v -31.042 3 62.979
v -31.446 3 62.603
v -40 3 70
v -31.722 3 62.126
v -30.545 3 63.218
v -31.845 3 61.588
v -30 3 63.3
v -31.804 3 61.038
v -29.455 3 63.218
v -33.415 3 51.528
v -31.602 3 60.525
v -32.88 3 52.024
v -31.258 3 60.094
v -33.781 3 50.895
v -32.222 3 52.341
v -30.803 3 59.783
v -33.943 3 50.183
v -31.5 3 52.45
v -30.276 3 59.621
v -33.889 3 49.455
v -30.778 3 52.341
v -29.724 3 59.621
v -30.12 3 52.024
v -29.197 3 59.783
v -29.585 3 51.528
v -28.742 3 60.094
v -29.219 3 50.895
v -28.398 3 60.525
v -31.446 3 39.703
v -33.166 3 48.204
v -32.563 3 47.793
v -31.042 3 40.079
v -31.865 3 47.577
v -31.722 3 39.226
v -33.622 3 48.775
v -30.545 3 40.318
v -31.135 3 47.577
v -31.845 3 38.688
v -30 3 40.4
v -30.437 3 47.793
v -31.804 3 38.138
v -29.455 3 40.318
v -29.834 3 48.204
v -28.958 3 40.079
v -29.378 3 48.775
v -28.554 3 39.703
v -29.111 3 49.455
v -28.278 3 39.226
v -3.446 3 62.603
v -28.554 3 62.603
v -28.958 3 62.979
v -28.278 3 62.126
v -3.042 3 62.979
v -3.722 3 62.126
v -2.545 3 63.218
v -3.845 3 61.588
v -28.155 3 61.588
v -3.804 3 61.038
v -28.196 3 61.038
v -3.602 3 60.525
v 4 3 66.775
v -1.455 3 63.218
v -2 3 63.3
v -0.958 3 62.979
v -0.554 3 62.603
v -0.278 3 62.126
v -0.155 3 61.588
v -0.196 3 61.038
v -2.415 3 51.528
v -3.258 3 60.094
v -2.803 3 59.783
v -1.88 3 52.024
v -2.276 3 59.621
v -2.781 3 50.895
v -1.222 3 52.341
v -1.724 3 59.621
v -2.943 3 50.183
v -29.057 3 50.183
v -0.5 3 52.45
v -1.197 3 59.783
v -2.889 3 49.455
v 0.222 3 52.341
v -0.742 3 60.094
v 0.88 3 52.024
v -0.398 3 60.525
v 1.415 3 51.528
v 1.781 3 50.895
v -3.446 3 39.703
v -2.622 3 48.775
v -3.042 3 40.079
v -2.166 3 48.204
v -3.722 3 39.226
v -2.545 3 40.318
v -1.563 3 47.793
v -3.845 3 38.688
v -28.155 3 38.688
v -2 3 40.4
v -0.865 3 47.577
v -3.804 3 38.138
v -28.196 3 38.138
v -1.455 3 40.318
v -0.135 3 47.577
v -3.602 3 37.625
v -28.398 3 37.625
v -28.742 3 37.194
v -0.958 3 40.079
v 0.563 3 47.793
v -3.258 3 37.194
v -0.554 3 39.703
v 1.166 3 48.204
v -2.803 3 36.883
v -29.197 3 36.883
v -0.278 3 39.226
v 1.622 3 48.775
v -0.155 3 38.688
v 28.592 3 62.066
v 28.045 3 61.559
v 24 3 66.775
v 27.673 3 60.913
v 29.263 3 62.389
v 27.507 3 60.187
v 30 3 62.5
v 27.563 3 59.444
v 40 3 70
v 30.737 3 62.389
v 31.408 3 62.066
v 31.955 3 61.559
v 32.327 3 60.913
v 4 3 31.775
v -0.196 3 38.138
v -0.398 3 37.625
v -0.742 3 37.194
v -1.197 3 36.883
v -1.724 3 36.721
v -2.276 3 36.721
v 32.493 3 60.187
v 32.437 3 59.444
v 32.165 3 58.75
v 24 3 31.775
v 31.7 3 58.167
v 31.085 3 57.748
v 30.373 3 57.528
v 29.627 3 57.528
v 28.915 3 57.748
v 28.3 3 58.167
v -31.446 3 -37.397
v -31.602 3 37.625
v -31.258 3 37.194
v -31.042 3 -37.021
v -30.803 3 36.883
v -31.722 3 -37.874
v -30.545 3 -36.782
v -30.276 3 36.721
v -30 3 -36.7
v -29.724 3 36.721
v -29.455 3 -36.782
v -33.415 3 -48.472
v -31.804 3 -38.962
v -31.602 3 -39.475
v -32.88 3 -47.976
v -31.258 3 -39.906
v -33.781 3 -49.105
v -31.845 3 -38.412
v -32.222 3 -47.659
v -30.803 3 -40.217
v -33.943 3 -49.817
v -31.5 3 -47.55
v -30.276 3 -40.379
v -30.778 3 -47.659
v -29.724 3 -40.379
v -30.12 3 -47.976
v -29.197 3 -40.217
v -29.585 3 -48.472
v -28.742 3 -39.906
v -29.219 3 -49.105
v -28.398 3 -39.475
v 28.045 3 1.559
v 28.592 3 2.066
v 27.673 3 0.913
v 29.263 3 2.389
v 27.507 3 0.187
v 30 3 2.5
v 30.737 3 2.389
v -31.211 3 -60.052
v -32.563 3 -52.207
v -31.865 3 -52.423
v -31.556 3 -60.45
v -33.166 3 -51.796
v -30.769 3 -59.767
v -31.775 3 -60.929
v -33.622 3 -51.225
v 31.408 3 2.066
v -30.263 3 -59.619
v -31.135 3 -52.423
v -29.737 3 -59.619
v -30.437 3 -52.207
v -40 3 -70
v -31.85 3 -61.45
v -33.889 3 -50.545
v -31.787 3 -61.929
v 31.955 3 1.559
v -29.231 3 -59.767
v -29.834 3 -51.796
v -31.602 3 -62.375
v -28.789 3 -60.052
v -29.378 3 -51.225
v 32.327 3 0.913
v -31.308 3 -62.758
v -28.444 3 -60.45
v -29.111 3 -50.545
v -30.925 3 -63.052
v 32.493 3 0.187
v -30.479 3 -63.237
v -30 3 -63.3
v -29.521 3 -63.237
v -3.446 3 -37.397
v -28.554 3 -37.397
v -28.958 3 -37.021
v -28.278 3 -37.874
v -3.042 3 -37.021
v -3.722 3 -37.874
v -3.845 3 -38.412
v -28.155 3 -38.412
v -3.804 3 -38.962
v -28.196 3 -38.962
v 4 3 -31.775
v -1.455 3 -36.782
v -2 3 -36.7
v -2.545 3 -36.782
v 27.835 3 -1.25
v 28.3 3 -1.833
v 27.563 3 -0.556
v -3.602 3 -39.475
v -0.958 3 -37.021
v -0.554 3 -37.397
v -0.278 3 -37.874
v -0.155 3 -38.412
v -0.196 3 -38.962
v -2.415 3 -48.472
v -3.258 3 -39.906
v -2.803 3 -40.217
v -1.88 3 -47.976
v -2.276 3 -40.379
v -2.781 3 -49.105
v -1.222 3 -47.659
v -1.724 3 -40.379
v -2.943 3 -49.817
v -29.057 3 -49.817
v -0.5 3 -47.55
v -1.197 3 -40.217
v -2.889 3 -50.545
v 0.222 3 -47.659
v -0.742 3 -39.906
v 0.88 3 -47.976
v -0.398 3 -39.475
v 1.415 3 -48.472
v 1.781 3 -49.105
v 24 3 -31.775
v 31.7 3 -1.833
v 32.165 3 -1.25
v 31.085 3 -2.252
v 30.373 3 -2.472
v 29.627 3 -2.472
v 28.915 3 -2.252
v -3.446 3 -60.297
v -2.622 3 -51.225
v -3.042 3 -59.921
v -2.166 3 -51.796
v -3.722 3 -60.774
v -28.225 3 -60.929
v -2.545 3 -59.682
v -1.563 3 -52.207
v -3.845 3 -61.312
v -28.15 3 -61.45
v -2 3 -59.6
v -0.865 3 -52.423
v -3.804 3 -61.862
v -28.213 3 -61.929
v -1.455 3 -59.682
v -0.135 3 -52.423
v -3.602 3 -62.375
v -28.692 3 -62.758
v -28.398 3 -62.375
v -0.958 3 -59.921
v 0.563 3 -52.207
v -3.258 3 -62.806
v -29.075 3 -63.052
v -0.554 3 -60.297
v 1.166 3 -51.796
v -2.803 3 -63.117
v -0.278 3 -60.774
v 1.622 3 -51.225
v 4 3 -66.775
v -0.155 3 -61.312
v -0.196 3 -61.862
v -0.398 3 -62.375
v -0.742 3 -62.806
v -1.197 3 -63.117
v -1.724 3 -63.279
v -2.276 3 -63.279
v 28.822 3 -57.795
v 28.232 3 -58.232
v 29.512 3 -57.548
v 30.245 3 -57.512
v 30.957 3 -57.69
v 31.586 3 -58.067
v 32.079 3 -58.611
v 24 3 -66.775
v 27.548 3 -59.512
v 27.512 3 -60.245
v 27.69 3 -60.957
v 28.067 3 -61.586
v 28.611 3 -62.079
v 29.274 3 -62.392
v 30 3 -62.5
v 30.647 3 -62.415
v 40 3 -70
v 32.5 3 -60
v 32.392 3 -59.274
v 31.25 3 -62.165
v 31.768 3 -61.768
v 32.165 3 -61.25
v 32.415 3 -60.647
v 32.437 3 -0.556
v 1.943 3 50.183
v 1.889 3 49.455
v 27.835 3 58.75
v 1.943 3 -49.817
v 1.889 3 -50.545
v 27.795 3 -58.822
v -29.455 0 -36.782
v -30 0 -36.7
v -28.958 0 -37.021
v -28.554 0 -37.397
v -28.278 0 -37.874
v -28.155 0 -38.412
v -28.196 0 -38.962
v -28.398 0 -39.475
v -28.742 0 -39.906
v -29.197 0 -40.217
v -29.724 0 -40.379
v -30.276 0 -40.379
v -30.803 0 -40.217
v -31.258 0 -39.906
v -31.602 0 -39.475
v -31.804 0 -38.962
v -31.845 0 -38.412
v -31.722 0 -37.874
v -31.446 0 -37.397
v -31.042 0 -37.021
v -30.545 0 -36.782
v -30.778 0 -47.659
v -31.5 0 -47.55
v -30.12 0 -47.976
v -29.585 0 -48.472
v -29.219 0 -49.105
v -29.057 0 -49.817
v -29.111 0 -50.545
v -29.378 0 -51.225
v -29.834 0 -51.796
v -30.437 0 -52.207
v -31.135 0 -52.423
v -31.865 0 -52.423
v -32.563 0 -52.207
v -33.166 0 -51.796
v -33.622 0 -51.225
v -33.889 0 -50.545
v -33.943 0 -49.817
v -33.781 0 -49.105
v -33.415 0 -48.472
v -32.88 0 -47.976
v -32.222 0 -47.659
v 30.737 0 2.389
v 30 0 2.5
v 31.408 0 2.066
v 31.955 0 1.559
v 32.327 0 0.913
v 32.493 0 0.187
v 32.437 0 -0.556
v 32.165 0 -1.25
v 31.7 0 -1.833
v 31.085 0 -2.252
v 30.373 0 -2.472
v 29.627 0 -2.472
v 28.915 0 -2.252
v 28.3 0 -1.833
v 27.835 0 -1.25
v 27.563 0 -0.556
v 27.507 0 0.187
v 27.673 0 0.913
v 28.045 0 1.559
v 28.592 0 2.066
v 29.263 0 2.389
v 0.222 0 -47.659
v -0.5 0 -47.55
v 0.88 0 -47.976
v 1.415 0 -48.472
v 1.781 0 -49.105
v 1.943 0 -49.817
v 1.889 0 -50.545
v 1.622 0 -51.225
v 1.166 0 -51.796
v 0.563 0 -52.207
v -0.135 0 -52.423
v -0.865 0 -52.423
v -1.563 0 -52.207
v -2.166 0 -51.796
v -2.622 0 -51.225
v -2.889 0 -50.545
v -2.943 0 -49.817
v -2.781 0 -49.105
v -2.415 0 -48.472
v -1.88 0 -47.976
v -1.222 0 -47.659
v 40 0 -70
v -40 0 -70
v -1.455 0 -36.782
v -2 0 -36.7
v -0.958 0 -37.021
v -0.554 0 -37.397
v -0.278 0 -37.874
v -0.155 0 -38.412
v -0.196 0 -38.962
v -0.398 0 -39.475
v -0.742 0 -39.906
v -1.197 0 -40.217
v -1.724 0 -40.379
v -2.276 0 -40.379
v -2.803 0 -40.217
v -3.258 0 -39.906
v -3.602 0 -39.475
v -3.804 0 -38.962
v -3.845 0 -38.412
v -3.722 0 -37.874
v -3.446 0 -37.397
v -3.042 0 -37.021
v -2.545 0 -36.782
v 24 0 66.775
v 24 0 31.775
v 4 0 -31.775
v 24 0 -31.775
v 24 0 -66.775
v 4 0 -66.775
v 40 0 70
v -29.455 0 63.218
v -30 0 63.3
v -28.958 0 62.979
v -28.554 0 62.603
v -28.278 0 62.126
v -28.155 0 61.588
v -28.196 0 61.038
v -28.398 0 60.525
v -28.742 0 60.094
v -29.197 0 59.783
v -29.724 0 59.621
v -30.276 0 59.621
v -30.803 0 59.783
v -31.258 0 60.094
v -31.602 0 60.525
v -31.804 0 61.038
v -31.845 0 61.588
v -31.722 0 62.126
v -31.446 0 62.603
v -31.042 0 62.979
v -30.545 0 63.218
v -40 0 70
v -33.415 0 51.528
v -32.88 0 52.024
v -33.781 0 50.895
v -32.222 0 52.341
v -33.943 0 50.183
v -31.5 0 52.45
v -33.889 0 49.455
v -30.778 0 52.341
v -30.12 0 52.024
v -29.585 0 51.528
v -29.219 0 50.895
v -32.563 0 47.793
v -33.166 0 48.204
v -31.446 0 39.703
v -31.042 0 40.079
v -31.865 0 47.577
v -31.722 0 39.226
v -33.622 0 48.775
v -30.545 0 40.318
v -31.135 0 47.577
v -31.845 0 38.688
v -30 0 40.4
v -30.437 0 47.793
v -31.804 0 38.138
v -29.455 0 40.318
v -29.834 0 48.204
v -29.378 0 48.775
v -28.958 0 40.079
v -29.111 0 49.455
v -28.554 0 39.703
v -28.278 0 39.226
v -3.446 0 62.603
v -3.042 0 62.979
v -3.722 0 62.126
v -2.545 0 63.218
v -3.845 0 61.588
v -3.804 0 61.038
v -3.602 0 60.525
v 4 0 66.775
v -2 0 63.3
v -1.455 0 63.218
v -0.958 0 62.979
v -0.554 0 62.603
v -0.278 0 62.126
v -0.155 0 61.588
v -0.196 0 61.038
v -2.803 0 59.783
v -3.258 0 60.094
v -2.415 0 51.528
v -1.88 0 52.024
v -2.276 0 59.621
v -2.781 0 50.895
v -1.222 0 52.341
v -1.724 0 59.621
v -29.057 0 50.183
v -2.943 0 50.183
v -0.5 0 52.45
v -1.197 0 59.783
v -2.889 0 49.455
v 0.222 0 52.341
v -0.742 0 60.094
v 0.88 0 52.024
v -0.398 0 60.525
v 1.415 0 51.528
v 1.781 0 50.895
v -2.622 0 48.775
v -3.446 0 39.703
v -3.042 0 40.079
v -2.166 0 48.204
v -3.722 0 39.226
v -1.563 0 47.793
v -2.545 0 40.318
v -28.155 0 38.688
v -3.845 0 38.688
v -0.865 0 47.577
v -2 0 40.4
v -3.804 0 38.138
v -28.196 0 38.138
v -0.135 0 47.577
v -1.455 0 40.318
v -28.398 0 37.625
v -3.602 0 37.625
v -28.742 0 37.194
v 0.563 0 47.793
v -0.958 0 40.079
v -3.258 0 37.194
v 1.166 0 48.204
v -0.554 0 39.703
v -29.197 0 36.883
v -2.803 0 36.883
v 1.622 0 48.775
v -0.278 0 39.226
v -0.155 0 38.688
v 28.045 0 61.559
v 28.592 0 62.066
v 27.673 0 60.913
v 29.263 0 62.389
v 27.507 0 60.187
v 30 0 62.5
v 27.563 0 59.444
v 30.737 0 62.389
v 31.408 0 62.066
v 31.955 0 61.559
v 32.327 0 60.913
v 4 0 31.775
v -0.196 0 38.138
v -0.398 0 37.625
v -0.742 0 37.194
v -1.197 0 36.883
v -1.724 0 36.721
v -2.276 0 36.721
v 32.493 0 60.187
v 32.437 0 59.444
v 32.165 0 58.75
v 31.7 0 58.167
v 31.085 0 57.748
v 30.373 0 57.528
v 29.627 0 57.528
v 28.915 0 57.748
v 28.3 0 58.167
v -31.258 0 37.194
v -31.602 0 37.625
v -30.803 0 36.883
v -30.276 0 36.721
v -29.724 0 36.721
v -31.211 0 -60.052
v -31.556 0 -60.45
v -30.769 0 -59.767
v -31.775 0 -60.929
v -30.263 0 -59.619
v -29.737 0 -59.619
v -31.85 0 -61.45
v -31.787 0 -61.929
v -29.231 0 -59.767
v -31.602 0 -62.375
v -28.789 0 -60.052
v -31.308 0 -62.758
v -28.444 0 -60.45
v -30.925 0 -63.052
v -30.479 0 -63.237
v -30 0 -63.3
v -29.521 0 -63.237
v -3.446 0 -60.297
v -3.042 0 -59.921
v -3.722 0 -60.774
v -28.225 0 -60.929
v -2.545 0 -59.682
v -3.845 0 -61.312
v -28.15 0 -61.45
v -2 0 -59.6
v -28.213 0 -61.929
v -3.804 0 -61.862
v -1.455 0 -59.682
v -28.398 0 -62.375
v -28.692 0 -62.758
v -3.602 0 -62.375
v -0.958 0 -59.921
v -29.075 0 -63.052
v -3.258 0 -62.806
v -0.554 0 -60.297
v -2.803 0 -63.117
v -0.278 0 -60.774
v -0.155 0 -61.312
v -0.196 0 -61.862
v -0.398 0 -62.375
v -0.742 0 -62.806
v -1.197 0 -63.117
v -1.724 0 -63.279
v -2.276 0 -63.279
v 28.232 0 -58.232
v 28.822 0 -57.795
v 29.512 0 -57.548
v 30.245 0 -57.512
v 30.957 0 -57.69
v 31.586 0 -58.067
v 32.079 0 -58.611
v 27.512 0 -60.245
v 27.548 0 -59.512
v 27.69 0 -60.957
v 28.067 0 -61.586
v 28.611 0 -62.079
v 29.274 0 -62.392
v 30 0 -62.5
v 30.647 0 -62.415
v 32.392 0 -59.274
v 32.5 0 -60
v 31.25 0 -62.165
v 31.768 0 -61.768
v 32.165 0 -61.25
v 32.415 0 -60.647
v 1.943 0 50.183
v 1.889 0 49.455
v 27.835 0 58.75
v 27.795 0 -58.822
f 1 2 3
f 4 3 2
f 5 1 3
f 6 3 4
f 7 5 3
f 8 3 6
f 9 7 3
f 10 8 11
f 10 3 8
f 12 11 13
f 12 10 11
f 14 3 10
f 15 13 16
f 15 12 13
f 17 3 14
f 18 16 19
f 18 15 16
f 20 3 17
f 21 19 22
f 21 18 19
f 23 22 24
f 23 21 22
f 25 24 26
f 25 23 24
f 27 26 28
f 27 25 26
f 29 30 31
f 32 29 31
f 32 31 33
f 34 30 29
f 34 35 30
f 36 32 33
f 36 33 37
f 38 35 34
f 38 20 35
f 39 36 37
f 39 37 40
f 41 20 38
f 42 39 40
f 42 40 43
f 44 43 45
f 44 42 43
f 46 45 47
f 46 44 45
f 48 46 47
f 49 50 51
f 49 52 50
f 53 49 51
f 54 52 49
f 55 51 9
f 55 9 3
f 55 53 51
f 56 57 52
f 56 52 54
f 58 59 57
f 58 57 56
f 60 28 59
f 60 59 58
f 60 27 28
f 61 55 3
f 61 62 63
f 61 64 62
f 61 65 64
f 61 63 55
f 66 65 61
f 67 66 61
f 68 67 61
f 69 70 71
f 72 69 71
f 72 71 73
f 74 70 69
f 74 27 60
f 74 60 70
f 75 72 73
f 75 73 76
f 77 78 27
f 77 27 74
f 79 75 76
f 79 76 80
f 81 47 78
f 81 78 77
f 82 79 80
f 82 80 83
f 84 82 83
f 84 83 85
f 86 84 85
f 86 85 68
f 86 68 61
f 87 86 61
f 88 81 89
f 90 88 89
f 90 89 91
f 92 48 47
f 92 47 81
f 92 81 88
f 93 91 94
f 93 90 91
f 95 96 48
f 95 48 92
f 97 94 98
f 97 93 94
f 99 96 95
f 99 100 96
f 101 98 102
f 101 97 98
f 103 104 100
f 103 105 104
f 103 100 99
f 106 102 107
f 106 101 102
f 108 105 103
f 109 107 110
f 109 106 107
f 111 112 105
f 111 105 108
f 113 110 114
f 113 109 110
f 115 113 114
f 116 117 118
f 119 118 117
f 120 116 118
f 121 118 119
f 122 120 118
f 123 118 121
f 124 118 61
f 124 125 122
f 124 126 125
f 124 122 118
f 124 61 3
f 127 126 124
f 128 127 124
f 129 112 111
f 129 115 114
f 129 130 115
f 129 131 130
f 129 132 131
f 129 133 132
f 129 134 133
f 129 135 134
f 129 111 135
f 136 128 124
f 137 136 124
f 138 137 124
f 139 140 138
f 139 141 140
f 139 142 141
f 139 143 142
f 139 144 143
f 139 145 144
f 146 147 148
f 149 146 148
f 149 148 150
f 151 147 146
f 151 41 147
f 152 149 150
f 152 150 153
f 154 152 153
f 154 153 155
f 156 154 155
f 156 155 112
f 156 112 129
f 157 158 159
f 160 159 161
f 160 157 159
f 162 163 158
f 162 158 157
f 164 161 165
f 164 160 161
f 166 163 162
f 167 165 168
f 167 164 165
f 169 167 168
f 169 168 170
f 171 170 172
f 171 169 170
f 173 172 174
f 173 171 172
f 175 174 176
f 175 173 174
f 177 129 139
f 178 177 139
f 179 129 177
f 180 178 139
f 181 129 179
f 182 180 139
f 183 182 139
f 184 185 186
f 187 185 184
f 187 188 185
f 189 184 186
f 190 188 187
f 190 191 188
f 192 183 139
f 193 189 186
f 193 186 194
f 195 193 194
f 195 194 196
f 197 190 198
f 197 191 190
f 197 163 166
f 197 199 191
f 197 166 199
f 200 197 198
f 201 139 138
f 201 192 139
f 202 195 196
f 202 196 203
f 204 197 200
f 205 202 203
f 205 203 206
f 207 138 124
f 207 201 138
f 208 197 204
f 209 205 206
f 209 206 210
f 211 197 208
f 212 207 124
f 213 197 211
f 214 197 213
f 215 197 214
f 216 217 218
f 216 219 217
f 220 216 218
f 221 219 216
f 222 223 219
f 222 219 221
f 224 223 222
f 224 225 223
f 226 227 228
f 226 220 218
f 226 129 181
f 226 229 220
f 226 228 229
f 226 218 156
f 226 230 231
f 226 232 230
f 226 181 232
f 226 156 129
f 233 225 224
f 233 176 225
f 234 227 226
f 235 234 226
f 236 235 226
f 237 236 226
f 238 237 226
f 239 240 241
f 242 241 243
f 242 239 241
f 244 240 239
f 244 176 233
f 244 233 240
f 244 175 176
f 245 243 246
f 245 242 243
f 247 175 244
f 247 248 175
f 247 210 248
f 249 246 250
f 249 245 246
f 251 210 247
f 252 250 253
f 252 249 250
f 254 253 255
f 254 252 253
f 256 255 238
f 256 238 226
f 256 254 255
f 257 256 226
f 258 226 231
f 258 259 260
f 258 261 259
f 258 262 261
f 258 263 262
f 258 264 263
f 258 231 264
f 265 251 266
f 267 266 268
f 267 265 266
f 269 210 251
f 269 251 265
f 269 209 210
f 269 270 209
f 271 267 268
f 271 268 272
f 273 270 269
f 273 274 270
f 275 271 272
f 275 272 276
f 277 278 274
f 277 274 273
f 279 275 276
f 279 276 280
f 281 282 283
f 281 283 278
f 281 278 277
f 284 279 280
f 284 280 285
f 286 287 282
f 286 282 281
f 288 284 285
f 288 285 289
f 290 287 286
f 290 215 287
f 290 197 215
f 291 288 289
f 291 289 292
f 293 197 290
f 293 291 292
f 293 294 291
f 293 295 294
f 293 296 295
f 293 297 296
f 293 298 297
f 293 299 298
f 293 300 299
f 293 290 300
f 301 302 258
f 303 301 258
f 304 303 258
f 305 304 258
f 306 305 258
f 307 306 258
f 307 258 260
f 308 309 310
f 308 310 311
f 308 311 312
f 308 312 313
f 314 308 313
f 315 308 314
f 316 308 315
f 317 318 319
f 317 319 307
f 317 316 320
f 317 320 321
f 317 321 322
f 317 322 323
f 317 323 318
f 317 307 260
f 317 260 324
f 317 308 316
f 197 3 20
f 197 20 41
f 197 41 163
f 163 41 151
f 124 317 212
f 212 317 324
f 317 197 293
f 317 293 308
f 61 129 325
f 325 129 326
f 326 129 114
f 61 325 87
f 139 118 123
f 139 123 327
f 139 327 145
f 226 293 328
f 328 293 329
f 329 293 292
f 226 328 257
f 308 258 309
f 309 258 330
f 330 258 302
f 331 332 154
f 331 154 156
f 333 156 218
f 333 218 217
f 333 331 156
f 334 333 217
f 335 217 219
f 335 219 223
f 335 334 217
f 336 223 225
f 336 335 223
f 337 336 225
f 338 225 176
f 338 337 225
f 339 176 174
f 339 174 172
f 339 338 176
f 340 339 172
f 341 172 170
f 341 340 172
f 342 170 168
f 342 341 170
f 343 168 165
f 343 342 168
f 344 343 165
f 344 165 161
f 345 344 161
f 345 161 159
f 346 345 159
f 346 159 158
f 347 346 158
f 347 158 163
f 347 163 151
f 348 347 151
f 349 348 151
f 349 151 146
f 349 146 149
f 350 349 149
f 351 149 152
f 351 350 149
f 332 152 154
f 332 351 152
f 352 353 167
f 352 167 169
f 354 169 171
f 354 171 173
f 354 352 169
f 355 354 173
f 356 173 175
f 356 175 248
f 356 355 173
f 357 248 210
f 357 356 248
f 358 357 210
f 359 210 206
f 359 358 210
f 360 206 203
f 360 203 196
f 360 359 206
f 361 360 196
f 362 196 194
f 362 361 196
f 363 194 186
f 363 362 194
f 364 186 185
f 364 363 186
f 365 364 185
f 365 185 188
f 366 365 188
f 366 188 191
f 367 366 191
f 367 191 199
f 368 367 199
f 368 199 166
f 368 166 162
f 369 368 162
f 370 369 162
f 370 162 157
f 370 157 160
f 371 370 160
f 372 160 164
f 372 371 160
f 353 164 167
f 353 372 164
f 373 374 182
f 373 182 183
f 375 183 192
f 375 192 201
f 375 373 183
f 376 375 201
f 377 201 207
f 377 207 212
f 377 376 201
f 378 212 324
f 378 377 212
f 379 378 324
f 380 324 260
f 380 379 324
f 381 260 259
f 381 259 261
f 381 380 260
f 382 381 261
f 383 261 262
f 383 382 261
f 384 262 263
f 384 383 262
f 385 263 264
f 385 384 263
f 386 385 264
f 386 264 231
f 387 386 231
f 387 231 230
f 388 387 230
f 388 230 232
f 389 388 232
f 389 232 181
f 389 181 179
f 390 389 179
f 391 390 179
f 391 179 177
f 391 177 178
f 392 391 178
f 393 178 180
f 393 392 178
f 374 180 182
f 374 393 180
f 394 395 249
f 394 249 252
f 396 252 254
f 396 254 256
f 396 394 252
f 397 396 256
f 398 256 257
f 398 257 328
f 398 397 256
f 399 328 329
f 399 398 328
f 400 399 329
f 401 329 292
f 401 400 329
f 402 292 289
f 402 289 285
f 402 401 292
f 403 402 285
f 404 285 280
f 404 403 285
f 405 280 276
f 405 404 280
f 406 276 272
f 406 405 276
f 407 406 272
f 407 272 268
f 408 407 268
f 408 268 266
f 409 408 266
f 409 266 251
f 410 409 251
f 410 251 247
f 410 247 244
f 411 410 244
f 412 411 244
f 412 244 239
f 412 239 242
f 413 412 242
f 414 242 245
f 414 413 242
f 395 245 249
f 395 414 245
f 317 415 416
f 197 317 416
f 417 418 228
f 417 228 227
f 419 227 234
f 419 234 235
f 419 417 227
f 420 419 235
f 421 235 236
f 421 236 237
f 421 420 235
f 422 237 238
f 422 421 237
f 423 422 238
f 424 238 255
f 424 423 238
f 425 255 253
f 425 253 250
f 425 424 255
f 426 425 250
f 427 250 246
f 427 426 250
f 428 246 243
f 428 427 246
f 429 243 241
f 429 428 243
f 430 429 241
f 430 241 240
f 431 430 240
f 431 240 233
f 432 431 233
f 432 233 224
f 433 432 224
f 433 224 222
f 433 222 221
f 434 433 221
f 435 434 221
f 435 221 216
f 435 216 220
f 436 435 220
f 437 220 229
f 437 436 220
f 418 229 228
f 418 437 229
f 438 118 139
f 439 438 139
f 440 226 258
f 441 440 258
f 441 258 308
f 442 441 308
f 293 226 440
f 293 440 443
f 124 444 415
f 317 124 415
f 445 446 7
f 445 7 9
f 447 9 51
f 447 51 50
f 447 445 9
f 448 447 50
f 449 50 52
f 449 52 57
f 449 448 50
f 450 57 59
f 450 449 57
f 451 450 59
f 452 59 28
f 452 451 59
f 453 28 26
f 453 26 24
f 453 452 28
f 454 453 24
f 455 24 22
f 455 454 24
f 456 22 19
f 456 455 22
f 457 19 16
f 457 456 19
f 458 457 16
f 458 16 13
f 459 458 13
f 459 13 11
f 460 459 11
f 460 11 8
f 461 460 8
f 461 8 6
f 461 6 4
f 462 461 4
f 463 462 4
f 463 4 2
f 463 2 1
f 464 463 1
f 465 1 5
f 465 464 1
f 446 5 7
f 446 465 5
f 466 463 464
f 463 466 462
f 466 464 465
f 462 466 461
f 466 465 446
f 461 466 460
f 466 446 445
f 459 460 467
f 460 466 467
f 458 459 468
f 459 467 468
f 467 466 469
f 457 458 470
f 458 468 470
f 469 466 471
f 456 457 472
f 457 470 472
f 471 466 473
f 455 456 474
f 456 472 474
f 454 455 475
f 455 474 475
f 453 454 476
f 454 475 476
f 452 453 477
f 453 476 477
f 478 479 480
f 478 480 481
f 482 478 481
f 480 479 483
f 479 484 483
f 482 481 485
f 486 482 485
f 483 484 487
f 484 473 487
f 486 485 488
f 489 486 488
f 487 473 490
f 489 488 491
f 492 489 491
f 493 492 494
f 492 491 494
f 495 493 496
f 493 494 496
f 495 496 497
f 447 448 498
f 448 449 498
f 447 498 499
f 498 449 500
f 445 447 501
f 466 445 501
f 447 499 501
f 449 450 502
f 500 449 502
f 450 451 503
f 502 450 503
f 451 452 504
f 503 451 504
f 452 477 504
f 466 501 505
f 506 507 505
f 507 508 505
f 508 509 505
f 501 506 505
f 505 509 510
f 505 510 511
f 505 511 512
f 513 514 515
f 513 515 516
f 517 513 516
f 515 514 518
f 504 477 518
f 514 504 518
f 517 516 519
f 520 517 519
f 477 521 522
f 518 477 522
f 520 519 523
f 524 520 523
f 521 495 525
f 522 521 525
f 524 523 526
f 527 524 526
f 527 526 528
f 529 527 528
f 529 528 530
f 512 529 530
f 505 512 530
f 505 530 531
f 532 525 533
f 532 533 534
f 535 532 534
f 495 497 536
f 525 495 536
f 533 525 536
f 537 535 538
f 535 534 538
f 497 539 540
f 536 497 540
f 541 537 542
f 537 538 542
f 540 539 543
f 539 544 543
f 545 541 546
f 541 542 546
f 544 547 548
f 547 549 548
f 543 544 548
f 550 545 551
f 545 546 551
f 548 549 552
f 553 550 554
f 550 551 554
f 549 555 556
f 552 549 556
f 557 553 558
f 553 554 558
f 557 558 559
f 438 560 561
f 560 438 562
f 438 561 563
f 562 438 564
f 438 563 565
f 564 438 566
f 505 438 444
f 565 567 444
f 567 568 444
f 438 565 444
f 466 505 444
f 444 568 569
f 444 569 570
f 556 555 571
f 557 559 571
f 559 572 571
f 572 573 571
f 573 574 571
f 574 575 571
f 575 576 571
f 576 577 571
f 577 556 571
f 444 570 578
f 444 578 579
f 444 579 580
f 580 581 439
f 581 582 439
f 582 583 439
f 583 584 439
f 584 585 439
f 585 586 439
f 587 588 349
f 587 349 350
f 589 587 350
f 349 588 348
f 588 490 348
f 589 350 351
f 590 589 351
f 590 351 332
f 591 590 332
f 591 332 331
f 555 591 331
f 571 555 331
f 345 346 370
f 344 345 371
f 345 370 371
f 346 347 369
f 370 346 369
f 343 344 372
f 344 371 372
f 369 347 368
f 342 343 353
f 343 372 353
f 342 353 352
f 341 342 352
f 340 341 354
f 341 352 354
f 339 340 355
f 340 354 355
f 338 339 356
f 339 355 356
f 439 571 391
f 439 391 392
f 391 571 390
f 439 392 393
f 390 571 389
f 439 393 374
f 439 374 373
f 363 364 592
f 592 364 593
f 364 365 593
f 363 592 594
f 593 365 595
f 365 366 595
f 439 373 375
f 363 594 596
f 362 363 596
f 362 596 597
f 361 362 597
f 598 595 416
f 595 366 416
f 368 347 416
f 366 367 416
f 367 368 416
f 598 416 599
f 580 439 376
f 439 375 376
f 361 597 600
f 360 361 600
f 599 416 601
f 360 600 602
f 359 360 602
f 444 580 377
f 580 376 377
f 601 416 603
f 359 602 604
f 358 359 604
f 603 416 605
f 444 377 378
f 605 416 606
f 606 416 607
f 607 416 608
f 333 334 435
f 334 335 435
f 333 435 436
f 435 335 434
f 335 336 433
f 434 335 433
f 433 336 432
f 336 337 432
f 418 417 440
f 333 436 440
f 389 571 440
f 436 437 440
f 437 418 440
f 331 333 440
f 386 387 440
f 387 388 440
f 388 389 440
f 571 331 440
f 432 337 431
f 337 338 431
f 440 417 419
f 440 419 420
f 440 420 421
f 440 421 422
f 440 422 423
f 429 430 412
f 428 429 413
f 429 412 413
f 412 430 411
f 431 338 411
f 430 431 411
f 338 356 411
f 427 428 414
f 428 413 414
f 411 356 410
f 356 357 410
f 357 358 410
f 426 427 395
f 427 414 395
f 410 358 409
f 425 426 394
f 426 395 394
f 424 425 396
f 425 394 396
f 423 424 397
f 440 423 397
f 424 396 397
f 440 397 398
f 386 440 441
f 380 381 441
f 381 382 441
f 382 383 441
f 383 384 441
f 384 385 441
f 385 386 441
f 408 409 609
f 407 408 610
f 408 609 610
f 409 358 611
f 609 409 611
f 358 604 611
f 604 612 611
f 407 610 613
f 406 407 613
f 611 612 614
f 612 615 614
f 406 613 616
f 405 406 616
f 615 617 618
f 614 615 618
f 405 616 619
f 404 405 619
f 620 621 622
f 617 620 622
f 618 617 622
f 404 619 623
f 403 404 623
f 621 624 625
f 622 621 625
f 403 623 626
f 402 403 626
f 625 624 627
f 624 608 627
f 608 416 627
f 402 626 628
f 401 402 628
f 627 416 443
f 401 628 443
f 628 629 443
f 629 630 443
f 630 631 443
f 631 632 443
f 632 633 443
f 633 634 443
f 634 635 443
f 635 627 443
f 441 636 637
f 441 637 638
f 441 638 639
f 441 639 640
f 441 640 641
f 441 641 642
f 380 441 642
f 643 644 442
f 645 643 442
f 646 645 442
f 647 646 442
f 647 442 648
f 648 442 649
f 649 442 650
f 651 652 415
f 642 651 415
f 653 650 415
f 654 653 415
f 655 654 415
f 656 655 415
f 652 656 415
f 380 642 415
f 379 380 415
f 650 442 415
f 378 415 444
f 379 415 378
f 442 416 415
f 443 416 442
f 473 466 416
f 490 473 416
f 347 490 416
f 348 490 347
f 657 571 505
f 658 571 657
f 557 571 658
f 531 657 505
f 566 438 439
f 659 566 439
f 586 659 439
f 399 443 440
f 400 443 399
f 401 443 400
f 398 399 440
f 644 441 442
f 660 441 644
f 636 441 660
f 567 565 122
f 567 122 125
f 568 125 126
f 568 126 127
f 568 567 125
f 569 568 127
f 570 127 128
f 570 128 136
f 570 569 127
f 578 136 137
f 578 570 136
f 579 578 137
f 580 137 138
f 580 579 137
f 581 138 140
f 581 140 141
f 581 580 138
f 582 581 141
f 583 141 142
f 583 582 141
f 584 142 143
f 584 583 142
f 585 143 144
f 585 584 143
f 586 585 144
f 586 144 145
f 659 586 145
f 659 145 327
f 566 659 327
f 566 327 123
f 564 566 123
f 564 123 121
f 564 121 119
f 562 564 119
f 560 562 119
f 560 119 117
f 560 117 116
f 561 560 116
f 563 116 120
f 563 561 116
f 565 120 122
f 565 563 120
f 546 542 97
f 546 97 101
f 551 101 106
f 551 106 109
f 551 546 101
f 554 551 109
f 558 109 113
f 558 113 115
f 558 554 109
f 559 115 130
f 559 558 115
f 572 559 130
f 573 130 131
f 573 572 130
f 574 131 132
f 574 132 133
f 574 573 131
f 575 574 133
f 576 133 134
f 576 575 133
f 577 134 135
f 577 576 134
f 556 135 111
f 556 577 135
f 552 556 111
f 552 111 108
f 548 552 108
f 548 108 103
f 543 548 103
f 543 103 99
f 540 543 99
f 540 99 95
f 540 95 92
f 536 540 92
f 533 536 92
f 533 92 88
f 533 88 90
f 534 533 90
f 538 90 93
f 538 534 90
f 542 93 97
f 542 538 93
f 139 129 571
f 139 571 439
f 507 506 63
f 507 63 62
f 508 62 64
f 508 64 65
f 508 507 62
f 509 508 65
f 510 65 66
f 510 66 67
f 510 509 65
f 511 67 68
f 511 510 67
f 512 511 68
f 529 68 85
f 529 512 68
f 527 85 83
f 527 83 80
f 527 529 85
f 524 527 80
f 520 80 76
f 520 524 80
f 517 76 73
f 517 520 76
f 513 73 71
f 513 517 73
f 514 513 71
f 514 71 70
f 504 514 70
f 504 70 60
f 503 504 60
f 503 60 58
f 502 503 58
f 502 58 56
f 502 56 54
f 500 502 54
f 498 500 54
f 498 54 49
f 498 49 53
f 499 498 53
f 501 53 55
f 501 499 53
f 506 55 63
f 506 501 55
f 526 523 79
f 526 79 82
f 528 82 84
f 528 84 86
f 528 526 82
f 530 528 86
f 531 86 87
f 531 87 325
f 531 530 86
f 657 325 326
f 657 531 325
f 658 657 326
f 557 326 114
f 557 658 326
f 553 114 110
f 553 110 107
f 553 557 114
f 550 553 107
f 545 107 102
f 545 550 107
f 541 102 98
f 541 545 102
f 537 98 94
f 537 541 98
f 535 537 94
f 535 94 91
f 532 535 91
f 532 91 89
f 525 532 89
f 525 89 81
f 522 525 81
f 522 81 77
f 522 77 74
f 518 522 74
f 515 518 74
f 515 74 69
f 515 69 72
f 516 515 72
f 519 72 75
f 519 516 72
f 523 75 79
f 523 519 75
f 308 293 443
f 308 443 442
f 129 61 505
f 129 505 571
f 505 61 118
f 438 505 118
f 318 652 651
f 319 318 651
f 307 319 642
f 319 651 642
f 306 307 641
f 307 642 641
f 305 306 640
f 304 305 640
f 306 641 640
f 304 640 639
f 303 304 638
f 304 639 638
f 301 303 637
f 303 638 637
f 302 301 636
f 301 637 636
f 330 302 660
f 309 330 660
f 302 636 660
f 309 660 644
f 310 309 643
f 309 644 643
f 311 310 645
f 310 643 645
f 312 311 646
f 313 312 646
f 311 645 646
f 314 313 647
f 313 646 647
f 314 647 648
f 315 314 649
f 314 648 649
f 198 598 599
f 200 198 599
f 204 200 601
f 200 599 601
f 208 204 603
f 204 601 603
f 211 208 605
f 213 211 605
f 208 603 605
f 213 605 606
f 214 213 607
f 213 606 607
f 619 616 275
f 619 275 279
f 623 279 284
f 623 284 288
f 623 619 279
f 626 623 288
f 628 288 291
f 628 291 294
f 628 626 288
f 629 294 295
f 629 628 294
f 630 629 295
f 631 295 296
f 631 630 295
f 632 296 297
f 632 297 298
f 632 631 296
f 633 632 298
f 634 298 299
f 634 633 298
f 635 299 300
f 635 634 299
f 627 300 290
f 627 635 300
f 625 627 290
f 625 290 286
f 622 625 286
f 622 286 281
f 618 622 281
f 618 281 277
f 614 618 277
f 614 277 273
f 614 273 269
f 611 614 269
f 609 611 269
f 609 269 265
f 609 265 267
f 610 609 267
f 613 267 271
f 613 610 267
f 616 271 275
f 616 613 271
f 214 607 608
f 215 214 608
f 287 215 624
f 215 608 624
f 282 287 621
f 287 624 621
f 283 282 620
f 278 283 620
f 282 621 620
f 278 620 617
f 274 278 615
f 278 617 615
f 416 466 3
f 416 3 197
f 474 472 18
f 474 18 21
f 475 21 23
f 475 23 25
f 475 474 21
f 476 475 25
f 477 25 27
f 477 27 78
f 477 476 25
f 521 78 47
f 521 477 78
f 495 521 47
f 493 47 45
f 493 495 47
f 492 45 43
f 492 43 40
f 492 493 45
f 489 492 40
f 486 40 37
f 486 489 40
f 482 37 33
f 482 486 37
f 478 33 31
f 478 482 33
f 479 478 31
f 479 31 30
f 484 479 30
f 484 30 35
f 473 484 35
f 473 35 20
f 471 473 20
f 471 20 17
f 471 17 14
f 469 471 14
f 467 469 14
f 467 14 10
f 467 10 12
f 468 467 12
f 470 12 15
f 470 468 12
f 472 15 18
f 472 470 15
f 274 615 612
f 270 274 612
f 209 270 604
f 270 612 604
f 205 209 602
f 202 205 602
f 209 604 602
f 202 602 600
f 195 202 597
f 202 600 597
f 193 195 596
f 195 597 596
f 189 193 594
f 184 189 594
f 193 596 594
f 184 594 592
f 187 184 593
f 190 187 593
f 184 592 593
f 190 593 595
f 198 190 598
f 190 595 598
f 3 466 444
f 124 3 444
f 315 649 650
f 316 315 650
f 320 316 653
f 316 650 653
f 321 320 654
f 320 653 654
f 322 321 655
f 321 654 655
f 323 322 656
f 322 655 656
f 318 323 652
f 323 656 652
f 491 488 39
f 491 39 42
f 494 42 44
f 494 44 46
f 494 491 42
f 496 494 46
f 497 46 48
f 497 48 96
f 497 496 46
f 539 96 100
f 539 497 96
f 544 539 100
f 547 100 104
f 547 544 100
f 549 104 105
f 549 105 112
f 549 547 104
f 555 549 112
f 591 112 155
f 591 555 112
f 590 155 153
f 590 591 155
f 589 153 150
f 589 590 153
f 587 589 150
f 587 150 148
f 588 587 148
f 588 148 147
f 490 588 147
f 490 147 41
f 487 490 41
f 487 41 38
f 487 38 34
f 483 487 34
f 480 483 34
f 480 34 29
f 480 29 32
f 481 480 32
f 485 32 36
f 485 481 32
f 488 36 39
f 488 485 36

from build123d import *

# Parameters (mm, degrees)
SKETCH_1_R          = 2.5
SKETCH_1_R_2        = 2.45
SKETCH_1_R_3        = 1.85
SKETCH_1_W          = 48
SKETCH_1_H          = 40
EXTRUDE_1_DEPTH     = 3
SKETCH_2_W          = 20
SKETCH_2_H          = 35
CUT_EXTRUDE_1_DEPTH = 10


with BuildPart() as part:
    # 草图1 → 凸台-拉伸1 (new body)
    # profile 1 of 5: a face of its own
    with BuildSketch(Plane(origin=(0, 0, 0), x_dir=(1, 0, 0), z_dir=(0, 1, 0))):
        with BuildLine():
            Line((8, -30), (8, -70))
            Line((8, -70), (40, -70))
            Line((40, -70), (40, 60))
            Line((40, 60), (32.5, 60))
            ThreePointArc((32.5, 60), (28.232233047, 58.232233047), (30, 62.5))
            Line((30, 62.5), (30, 70))
            Line((30, 70), (8, 70))
            Line((8, 70), (8, 30))
            Line((8, 30), (-40, 30))
            Line((-40, 30), (-40, -30))
            Line((-40, -30), (8, -30))
        make_face()
        with Locations(Location((30, -60, 0), (0, 0, 270))):
            Circle(SKETCH_1_R, mode=Mode.SUBTRACT)
        with Locations(Location((30, 0, 0), (0, 0, 270))):
            Circle(SKETCH_1_R, mode=Mode.SUBTRACT)
    # profile 2 of 5: a face of its own
    with BuildSketch(Plane(origin=(0, 0, 0), x_dir=(1, 0, 0), z_dir=(0, 1, 0))):
        with BuildLine():
            Line((32.5, 60), (40, 60))
            Line((40, 60), (40, 70))
            Line((40, 70), (30, 70))
            Line((30, 70), (30, 62.5))
            ThreePointArc((30, 62.5), (31.767766953, 61.767766953), (32.5, 60))
        make_face()
    # profile 3 of 5: a face of its own
    with BuildSketch(Plane(origin=(0, 0, 0), x_dir=(1, 0, 0), z_dir=(0, 1, 0))):
        with BuildLine():
            Line((-40, 61.45), (-40, 30))
            Line((-40, 30), (8, 30))
            Line((8, 30), (8, 70))
            Line((8, 70), (-30, 70))
            Line((-30, 70), (-30, 63.3))
            ThreePointArc((-30, 63.3), (-28.691852455, 62.758147545), (-28.15, 61.45))
            ThreePointArc((-28.15, 61.45), (-30, 59.6), (-31.85, 61.45))
            Line((-31.85, 61.45), (-40, 61.45))
        make_face()
        with Locations(Location((-31.5, 50, 0), (0, 0, 270))):
            Circle(SKETCH_1_R_2, mode=Mode.SUBTRACT)
        with Locations(Location((-30, 38.55, 0), (0, 0, 270))):
            Circle(SKETCH_1_R_3, mode=Mode.SUBTRACT)
        with Locations(Location((-2, 38.55, 0), (0, 0, 270))):
            Circle(SKETCH_1_R_3, mode=Mode.SUBTRACT)
        with Locations(Location((-0.5, 50, 0), (0, 0, 270))):
            Circle(SKETCH_1_R_2, mode=Mode.SUBTRACT)
        with Locations(Location((-2, 61.45, 0), (0, 0, 270))):
            Circle(SKETCH_1_R_3, mode=Mode.SUBTRACT)
    # profile 4 of 5: a face of its own
    with BuildSketch(Plane(origin=(0, 0, 0), x_dir=(1, 0, 0), z_dir=(0, 1, 0))):
        with BuildLine():
            Line((-40, 70), (-40, 61.45))
            Line((-40, 61.45), (-31.85, 61.45))
            ThreePointArc((-31.85, 61.45), (-31.308147545, 62.758147545), (-30, 63.3))
            Line((-30, 63.3), (-30, 70))
            Line((-30, 70), (-40, 70))
        make_face()
    # profile 5 of 5: a face of its own
    with BuildSketch(Plane(origin=(0, 0, 0), x_dir=(1, 0, 0), z_dir=(0, 1, 0))):
        with Locations((-16, -50)):
            Rectangle(SKETCH_1_W, SKETCH_1_H)
        with Locations(Location((-30, -61.45, 0), (0, 0, 270))):
            Circle(SKETCH_1_R_3, mode=Mode.SUBTRACT)
        with Locations(Location((-31.5, -50, 0), (0, 0, 270))):
            Circle(SKETCH_1_R_2, mode=Mode.SUBTRACT)
        with Locations(Location((-30, -38.55, 0), (0, 0, 270))):
            Circle(SKETCH_1_R_3, mode=Mode.SUBTRACT)
        with Locations(Location((-2, -61.45, 0), (0, 0, 270))):
            Circle(SKETCH_1_R_3, mode=Mode.SUBTRACT)
        with Locations(Location((-0.5, -50, 0), (0, 0, 270))):
            Circle(SKETCH_1_R_2, mode=Mode.SUBTRACT)
        with Locations(Location((-2, -38.55, 0), (0, 0, 270))):
            Circle(SKETCH_1_R_3, mode=Mode.SUBTRACT)
    extrude(amount=EXTRUDE_1_DEPTH)

    # 草图2 → 切除-拉伸1 (cut)
    with BuildSketch(Plane(origin=(0, 3, 0), x_dir=(1, 0, 0), z_dir=(0, 1, 0))):
        with Locations((14, 49.275)):
            Rectangle(SKETCH_2_W, SKETCH_2_H)
        with Locations((14, -49.275)):
            Rectangle(SKETCH_2_W, SKETCH_2_H)
    extrude(amount=-CUT_EXTRUDE_1_DEPTH, mode=Mode.SUBTRACT)


solid = part.part
